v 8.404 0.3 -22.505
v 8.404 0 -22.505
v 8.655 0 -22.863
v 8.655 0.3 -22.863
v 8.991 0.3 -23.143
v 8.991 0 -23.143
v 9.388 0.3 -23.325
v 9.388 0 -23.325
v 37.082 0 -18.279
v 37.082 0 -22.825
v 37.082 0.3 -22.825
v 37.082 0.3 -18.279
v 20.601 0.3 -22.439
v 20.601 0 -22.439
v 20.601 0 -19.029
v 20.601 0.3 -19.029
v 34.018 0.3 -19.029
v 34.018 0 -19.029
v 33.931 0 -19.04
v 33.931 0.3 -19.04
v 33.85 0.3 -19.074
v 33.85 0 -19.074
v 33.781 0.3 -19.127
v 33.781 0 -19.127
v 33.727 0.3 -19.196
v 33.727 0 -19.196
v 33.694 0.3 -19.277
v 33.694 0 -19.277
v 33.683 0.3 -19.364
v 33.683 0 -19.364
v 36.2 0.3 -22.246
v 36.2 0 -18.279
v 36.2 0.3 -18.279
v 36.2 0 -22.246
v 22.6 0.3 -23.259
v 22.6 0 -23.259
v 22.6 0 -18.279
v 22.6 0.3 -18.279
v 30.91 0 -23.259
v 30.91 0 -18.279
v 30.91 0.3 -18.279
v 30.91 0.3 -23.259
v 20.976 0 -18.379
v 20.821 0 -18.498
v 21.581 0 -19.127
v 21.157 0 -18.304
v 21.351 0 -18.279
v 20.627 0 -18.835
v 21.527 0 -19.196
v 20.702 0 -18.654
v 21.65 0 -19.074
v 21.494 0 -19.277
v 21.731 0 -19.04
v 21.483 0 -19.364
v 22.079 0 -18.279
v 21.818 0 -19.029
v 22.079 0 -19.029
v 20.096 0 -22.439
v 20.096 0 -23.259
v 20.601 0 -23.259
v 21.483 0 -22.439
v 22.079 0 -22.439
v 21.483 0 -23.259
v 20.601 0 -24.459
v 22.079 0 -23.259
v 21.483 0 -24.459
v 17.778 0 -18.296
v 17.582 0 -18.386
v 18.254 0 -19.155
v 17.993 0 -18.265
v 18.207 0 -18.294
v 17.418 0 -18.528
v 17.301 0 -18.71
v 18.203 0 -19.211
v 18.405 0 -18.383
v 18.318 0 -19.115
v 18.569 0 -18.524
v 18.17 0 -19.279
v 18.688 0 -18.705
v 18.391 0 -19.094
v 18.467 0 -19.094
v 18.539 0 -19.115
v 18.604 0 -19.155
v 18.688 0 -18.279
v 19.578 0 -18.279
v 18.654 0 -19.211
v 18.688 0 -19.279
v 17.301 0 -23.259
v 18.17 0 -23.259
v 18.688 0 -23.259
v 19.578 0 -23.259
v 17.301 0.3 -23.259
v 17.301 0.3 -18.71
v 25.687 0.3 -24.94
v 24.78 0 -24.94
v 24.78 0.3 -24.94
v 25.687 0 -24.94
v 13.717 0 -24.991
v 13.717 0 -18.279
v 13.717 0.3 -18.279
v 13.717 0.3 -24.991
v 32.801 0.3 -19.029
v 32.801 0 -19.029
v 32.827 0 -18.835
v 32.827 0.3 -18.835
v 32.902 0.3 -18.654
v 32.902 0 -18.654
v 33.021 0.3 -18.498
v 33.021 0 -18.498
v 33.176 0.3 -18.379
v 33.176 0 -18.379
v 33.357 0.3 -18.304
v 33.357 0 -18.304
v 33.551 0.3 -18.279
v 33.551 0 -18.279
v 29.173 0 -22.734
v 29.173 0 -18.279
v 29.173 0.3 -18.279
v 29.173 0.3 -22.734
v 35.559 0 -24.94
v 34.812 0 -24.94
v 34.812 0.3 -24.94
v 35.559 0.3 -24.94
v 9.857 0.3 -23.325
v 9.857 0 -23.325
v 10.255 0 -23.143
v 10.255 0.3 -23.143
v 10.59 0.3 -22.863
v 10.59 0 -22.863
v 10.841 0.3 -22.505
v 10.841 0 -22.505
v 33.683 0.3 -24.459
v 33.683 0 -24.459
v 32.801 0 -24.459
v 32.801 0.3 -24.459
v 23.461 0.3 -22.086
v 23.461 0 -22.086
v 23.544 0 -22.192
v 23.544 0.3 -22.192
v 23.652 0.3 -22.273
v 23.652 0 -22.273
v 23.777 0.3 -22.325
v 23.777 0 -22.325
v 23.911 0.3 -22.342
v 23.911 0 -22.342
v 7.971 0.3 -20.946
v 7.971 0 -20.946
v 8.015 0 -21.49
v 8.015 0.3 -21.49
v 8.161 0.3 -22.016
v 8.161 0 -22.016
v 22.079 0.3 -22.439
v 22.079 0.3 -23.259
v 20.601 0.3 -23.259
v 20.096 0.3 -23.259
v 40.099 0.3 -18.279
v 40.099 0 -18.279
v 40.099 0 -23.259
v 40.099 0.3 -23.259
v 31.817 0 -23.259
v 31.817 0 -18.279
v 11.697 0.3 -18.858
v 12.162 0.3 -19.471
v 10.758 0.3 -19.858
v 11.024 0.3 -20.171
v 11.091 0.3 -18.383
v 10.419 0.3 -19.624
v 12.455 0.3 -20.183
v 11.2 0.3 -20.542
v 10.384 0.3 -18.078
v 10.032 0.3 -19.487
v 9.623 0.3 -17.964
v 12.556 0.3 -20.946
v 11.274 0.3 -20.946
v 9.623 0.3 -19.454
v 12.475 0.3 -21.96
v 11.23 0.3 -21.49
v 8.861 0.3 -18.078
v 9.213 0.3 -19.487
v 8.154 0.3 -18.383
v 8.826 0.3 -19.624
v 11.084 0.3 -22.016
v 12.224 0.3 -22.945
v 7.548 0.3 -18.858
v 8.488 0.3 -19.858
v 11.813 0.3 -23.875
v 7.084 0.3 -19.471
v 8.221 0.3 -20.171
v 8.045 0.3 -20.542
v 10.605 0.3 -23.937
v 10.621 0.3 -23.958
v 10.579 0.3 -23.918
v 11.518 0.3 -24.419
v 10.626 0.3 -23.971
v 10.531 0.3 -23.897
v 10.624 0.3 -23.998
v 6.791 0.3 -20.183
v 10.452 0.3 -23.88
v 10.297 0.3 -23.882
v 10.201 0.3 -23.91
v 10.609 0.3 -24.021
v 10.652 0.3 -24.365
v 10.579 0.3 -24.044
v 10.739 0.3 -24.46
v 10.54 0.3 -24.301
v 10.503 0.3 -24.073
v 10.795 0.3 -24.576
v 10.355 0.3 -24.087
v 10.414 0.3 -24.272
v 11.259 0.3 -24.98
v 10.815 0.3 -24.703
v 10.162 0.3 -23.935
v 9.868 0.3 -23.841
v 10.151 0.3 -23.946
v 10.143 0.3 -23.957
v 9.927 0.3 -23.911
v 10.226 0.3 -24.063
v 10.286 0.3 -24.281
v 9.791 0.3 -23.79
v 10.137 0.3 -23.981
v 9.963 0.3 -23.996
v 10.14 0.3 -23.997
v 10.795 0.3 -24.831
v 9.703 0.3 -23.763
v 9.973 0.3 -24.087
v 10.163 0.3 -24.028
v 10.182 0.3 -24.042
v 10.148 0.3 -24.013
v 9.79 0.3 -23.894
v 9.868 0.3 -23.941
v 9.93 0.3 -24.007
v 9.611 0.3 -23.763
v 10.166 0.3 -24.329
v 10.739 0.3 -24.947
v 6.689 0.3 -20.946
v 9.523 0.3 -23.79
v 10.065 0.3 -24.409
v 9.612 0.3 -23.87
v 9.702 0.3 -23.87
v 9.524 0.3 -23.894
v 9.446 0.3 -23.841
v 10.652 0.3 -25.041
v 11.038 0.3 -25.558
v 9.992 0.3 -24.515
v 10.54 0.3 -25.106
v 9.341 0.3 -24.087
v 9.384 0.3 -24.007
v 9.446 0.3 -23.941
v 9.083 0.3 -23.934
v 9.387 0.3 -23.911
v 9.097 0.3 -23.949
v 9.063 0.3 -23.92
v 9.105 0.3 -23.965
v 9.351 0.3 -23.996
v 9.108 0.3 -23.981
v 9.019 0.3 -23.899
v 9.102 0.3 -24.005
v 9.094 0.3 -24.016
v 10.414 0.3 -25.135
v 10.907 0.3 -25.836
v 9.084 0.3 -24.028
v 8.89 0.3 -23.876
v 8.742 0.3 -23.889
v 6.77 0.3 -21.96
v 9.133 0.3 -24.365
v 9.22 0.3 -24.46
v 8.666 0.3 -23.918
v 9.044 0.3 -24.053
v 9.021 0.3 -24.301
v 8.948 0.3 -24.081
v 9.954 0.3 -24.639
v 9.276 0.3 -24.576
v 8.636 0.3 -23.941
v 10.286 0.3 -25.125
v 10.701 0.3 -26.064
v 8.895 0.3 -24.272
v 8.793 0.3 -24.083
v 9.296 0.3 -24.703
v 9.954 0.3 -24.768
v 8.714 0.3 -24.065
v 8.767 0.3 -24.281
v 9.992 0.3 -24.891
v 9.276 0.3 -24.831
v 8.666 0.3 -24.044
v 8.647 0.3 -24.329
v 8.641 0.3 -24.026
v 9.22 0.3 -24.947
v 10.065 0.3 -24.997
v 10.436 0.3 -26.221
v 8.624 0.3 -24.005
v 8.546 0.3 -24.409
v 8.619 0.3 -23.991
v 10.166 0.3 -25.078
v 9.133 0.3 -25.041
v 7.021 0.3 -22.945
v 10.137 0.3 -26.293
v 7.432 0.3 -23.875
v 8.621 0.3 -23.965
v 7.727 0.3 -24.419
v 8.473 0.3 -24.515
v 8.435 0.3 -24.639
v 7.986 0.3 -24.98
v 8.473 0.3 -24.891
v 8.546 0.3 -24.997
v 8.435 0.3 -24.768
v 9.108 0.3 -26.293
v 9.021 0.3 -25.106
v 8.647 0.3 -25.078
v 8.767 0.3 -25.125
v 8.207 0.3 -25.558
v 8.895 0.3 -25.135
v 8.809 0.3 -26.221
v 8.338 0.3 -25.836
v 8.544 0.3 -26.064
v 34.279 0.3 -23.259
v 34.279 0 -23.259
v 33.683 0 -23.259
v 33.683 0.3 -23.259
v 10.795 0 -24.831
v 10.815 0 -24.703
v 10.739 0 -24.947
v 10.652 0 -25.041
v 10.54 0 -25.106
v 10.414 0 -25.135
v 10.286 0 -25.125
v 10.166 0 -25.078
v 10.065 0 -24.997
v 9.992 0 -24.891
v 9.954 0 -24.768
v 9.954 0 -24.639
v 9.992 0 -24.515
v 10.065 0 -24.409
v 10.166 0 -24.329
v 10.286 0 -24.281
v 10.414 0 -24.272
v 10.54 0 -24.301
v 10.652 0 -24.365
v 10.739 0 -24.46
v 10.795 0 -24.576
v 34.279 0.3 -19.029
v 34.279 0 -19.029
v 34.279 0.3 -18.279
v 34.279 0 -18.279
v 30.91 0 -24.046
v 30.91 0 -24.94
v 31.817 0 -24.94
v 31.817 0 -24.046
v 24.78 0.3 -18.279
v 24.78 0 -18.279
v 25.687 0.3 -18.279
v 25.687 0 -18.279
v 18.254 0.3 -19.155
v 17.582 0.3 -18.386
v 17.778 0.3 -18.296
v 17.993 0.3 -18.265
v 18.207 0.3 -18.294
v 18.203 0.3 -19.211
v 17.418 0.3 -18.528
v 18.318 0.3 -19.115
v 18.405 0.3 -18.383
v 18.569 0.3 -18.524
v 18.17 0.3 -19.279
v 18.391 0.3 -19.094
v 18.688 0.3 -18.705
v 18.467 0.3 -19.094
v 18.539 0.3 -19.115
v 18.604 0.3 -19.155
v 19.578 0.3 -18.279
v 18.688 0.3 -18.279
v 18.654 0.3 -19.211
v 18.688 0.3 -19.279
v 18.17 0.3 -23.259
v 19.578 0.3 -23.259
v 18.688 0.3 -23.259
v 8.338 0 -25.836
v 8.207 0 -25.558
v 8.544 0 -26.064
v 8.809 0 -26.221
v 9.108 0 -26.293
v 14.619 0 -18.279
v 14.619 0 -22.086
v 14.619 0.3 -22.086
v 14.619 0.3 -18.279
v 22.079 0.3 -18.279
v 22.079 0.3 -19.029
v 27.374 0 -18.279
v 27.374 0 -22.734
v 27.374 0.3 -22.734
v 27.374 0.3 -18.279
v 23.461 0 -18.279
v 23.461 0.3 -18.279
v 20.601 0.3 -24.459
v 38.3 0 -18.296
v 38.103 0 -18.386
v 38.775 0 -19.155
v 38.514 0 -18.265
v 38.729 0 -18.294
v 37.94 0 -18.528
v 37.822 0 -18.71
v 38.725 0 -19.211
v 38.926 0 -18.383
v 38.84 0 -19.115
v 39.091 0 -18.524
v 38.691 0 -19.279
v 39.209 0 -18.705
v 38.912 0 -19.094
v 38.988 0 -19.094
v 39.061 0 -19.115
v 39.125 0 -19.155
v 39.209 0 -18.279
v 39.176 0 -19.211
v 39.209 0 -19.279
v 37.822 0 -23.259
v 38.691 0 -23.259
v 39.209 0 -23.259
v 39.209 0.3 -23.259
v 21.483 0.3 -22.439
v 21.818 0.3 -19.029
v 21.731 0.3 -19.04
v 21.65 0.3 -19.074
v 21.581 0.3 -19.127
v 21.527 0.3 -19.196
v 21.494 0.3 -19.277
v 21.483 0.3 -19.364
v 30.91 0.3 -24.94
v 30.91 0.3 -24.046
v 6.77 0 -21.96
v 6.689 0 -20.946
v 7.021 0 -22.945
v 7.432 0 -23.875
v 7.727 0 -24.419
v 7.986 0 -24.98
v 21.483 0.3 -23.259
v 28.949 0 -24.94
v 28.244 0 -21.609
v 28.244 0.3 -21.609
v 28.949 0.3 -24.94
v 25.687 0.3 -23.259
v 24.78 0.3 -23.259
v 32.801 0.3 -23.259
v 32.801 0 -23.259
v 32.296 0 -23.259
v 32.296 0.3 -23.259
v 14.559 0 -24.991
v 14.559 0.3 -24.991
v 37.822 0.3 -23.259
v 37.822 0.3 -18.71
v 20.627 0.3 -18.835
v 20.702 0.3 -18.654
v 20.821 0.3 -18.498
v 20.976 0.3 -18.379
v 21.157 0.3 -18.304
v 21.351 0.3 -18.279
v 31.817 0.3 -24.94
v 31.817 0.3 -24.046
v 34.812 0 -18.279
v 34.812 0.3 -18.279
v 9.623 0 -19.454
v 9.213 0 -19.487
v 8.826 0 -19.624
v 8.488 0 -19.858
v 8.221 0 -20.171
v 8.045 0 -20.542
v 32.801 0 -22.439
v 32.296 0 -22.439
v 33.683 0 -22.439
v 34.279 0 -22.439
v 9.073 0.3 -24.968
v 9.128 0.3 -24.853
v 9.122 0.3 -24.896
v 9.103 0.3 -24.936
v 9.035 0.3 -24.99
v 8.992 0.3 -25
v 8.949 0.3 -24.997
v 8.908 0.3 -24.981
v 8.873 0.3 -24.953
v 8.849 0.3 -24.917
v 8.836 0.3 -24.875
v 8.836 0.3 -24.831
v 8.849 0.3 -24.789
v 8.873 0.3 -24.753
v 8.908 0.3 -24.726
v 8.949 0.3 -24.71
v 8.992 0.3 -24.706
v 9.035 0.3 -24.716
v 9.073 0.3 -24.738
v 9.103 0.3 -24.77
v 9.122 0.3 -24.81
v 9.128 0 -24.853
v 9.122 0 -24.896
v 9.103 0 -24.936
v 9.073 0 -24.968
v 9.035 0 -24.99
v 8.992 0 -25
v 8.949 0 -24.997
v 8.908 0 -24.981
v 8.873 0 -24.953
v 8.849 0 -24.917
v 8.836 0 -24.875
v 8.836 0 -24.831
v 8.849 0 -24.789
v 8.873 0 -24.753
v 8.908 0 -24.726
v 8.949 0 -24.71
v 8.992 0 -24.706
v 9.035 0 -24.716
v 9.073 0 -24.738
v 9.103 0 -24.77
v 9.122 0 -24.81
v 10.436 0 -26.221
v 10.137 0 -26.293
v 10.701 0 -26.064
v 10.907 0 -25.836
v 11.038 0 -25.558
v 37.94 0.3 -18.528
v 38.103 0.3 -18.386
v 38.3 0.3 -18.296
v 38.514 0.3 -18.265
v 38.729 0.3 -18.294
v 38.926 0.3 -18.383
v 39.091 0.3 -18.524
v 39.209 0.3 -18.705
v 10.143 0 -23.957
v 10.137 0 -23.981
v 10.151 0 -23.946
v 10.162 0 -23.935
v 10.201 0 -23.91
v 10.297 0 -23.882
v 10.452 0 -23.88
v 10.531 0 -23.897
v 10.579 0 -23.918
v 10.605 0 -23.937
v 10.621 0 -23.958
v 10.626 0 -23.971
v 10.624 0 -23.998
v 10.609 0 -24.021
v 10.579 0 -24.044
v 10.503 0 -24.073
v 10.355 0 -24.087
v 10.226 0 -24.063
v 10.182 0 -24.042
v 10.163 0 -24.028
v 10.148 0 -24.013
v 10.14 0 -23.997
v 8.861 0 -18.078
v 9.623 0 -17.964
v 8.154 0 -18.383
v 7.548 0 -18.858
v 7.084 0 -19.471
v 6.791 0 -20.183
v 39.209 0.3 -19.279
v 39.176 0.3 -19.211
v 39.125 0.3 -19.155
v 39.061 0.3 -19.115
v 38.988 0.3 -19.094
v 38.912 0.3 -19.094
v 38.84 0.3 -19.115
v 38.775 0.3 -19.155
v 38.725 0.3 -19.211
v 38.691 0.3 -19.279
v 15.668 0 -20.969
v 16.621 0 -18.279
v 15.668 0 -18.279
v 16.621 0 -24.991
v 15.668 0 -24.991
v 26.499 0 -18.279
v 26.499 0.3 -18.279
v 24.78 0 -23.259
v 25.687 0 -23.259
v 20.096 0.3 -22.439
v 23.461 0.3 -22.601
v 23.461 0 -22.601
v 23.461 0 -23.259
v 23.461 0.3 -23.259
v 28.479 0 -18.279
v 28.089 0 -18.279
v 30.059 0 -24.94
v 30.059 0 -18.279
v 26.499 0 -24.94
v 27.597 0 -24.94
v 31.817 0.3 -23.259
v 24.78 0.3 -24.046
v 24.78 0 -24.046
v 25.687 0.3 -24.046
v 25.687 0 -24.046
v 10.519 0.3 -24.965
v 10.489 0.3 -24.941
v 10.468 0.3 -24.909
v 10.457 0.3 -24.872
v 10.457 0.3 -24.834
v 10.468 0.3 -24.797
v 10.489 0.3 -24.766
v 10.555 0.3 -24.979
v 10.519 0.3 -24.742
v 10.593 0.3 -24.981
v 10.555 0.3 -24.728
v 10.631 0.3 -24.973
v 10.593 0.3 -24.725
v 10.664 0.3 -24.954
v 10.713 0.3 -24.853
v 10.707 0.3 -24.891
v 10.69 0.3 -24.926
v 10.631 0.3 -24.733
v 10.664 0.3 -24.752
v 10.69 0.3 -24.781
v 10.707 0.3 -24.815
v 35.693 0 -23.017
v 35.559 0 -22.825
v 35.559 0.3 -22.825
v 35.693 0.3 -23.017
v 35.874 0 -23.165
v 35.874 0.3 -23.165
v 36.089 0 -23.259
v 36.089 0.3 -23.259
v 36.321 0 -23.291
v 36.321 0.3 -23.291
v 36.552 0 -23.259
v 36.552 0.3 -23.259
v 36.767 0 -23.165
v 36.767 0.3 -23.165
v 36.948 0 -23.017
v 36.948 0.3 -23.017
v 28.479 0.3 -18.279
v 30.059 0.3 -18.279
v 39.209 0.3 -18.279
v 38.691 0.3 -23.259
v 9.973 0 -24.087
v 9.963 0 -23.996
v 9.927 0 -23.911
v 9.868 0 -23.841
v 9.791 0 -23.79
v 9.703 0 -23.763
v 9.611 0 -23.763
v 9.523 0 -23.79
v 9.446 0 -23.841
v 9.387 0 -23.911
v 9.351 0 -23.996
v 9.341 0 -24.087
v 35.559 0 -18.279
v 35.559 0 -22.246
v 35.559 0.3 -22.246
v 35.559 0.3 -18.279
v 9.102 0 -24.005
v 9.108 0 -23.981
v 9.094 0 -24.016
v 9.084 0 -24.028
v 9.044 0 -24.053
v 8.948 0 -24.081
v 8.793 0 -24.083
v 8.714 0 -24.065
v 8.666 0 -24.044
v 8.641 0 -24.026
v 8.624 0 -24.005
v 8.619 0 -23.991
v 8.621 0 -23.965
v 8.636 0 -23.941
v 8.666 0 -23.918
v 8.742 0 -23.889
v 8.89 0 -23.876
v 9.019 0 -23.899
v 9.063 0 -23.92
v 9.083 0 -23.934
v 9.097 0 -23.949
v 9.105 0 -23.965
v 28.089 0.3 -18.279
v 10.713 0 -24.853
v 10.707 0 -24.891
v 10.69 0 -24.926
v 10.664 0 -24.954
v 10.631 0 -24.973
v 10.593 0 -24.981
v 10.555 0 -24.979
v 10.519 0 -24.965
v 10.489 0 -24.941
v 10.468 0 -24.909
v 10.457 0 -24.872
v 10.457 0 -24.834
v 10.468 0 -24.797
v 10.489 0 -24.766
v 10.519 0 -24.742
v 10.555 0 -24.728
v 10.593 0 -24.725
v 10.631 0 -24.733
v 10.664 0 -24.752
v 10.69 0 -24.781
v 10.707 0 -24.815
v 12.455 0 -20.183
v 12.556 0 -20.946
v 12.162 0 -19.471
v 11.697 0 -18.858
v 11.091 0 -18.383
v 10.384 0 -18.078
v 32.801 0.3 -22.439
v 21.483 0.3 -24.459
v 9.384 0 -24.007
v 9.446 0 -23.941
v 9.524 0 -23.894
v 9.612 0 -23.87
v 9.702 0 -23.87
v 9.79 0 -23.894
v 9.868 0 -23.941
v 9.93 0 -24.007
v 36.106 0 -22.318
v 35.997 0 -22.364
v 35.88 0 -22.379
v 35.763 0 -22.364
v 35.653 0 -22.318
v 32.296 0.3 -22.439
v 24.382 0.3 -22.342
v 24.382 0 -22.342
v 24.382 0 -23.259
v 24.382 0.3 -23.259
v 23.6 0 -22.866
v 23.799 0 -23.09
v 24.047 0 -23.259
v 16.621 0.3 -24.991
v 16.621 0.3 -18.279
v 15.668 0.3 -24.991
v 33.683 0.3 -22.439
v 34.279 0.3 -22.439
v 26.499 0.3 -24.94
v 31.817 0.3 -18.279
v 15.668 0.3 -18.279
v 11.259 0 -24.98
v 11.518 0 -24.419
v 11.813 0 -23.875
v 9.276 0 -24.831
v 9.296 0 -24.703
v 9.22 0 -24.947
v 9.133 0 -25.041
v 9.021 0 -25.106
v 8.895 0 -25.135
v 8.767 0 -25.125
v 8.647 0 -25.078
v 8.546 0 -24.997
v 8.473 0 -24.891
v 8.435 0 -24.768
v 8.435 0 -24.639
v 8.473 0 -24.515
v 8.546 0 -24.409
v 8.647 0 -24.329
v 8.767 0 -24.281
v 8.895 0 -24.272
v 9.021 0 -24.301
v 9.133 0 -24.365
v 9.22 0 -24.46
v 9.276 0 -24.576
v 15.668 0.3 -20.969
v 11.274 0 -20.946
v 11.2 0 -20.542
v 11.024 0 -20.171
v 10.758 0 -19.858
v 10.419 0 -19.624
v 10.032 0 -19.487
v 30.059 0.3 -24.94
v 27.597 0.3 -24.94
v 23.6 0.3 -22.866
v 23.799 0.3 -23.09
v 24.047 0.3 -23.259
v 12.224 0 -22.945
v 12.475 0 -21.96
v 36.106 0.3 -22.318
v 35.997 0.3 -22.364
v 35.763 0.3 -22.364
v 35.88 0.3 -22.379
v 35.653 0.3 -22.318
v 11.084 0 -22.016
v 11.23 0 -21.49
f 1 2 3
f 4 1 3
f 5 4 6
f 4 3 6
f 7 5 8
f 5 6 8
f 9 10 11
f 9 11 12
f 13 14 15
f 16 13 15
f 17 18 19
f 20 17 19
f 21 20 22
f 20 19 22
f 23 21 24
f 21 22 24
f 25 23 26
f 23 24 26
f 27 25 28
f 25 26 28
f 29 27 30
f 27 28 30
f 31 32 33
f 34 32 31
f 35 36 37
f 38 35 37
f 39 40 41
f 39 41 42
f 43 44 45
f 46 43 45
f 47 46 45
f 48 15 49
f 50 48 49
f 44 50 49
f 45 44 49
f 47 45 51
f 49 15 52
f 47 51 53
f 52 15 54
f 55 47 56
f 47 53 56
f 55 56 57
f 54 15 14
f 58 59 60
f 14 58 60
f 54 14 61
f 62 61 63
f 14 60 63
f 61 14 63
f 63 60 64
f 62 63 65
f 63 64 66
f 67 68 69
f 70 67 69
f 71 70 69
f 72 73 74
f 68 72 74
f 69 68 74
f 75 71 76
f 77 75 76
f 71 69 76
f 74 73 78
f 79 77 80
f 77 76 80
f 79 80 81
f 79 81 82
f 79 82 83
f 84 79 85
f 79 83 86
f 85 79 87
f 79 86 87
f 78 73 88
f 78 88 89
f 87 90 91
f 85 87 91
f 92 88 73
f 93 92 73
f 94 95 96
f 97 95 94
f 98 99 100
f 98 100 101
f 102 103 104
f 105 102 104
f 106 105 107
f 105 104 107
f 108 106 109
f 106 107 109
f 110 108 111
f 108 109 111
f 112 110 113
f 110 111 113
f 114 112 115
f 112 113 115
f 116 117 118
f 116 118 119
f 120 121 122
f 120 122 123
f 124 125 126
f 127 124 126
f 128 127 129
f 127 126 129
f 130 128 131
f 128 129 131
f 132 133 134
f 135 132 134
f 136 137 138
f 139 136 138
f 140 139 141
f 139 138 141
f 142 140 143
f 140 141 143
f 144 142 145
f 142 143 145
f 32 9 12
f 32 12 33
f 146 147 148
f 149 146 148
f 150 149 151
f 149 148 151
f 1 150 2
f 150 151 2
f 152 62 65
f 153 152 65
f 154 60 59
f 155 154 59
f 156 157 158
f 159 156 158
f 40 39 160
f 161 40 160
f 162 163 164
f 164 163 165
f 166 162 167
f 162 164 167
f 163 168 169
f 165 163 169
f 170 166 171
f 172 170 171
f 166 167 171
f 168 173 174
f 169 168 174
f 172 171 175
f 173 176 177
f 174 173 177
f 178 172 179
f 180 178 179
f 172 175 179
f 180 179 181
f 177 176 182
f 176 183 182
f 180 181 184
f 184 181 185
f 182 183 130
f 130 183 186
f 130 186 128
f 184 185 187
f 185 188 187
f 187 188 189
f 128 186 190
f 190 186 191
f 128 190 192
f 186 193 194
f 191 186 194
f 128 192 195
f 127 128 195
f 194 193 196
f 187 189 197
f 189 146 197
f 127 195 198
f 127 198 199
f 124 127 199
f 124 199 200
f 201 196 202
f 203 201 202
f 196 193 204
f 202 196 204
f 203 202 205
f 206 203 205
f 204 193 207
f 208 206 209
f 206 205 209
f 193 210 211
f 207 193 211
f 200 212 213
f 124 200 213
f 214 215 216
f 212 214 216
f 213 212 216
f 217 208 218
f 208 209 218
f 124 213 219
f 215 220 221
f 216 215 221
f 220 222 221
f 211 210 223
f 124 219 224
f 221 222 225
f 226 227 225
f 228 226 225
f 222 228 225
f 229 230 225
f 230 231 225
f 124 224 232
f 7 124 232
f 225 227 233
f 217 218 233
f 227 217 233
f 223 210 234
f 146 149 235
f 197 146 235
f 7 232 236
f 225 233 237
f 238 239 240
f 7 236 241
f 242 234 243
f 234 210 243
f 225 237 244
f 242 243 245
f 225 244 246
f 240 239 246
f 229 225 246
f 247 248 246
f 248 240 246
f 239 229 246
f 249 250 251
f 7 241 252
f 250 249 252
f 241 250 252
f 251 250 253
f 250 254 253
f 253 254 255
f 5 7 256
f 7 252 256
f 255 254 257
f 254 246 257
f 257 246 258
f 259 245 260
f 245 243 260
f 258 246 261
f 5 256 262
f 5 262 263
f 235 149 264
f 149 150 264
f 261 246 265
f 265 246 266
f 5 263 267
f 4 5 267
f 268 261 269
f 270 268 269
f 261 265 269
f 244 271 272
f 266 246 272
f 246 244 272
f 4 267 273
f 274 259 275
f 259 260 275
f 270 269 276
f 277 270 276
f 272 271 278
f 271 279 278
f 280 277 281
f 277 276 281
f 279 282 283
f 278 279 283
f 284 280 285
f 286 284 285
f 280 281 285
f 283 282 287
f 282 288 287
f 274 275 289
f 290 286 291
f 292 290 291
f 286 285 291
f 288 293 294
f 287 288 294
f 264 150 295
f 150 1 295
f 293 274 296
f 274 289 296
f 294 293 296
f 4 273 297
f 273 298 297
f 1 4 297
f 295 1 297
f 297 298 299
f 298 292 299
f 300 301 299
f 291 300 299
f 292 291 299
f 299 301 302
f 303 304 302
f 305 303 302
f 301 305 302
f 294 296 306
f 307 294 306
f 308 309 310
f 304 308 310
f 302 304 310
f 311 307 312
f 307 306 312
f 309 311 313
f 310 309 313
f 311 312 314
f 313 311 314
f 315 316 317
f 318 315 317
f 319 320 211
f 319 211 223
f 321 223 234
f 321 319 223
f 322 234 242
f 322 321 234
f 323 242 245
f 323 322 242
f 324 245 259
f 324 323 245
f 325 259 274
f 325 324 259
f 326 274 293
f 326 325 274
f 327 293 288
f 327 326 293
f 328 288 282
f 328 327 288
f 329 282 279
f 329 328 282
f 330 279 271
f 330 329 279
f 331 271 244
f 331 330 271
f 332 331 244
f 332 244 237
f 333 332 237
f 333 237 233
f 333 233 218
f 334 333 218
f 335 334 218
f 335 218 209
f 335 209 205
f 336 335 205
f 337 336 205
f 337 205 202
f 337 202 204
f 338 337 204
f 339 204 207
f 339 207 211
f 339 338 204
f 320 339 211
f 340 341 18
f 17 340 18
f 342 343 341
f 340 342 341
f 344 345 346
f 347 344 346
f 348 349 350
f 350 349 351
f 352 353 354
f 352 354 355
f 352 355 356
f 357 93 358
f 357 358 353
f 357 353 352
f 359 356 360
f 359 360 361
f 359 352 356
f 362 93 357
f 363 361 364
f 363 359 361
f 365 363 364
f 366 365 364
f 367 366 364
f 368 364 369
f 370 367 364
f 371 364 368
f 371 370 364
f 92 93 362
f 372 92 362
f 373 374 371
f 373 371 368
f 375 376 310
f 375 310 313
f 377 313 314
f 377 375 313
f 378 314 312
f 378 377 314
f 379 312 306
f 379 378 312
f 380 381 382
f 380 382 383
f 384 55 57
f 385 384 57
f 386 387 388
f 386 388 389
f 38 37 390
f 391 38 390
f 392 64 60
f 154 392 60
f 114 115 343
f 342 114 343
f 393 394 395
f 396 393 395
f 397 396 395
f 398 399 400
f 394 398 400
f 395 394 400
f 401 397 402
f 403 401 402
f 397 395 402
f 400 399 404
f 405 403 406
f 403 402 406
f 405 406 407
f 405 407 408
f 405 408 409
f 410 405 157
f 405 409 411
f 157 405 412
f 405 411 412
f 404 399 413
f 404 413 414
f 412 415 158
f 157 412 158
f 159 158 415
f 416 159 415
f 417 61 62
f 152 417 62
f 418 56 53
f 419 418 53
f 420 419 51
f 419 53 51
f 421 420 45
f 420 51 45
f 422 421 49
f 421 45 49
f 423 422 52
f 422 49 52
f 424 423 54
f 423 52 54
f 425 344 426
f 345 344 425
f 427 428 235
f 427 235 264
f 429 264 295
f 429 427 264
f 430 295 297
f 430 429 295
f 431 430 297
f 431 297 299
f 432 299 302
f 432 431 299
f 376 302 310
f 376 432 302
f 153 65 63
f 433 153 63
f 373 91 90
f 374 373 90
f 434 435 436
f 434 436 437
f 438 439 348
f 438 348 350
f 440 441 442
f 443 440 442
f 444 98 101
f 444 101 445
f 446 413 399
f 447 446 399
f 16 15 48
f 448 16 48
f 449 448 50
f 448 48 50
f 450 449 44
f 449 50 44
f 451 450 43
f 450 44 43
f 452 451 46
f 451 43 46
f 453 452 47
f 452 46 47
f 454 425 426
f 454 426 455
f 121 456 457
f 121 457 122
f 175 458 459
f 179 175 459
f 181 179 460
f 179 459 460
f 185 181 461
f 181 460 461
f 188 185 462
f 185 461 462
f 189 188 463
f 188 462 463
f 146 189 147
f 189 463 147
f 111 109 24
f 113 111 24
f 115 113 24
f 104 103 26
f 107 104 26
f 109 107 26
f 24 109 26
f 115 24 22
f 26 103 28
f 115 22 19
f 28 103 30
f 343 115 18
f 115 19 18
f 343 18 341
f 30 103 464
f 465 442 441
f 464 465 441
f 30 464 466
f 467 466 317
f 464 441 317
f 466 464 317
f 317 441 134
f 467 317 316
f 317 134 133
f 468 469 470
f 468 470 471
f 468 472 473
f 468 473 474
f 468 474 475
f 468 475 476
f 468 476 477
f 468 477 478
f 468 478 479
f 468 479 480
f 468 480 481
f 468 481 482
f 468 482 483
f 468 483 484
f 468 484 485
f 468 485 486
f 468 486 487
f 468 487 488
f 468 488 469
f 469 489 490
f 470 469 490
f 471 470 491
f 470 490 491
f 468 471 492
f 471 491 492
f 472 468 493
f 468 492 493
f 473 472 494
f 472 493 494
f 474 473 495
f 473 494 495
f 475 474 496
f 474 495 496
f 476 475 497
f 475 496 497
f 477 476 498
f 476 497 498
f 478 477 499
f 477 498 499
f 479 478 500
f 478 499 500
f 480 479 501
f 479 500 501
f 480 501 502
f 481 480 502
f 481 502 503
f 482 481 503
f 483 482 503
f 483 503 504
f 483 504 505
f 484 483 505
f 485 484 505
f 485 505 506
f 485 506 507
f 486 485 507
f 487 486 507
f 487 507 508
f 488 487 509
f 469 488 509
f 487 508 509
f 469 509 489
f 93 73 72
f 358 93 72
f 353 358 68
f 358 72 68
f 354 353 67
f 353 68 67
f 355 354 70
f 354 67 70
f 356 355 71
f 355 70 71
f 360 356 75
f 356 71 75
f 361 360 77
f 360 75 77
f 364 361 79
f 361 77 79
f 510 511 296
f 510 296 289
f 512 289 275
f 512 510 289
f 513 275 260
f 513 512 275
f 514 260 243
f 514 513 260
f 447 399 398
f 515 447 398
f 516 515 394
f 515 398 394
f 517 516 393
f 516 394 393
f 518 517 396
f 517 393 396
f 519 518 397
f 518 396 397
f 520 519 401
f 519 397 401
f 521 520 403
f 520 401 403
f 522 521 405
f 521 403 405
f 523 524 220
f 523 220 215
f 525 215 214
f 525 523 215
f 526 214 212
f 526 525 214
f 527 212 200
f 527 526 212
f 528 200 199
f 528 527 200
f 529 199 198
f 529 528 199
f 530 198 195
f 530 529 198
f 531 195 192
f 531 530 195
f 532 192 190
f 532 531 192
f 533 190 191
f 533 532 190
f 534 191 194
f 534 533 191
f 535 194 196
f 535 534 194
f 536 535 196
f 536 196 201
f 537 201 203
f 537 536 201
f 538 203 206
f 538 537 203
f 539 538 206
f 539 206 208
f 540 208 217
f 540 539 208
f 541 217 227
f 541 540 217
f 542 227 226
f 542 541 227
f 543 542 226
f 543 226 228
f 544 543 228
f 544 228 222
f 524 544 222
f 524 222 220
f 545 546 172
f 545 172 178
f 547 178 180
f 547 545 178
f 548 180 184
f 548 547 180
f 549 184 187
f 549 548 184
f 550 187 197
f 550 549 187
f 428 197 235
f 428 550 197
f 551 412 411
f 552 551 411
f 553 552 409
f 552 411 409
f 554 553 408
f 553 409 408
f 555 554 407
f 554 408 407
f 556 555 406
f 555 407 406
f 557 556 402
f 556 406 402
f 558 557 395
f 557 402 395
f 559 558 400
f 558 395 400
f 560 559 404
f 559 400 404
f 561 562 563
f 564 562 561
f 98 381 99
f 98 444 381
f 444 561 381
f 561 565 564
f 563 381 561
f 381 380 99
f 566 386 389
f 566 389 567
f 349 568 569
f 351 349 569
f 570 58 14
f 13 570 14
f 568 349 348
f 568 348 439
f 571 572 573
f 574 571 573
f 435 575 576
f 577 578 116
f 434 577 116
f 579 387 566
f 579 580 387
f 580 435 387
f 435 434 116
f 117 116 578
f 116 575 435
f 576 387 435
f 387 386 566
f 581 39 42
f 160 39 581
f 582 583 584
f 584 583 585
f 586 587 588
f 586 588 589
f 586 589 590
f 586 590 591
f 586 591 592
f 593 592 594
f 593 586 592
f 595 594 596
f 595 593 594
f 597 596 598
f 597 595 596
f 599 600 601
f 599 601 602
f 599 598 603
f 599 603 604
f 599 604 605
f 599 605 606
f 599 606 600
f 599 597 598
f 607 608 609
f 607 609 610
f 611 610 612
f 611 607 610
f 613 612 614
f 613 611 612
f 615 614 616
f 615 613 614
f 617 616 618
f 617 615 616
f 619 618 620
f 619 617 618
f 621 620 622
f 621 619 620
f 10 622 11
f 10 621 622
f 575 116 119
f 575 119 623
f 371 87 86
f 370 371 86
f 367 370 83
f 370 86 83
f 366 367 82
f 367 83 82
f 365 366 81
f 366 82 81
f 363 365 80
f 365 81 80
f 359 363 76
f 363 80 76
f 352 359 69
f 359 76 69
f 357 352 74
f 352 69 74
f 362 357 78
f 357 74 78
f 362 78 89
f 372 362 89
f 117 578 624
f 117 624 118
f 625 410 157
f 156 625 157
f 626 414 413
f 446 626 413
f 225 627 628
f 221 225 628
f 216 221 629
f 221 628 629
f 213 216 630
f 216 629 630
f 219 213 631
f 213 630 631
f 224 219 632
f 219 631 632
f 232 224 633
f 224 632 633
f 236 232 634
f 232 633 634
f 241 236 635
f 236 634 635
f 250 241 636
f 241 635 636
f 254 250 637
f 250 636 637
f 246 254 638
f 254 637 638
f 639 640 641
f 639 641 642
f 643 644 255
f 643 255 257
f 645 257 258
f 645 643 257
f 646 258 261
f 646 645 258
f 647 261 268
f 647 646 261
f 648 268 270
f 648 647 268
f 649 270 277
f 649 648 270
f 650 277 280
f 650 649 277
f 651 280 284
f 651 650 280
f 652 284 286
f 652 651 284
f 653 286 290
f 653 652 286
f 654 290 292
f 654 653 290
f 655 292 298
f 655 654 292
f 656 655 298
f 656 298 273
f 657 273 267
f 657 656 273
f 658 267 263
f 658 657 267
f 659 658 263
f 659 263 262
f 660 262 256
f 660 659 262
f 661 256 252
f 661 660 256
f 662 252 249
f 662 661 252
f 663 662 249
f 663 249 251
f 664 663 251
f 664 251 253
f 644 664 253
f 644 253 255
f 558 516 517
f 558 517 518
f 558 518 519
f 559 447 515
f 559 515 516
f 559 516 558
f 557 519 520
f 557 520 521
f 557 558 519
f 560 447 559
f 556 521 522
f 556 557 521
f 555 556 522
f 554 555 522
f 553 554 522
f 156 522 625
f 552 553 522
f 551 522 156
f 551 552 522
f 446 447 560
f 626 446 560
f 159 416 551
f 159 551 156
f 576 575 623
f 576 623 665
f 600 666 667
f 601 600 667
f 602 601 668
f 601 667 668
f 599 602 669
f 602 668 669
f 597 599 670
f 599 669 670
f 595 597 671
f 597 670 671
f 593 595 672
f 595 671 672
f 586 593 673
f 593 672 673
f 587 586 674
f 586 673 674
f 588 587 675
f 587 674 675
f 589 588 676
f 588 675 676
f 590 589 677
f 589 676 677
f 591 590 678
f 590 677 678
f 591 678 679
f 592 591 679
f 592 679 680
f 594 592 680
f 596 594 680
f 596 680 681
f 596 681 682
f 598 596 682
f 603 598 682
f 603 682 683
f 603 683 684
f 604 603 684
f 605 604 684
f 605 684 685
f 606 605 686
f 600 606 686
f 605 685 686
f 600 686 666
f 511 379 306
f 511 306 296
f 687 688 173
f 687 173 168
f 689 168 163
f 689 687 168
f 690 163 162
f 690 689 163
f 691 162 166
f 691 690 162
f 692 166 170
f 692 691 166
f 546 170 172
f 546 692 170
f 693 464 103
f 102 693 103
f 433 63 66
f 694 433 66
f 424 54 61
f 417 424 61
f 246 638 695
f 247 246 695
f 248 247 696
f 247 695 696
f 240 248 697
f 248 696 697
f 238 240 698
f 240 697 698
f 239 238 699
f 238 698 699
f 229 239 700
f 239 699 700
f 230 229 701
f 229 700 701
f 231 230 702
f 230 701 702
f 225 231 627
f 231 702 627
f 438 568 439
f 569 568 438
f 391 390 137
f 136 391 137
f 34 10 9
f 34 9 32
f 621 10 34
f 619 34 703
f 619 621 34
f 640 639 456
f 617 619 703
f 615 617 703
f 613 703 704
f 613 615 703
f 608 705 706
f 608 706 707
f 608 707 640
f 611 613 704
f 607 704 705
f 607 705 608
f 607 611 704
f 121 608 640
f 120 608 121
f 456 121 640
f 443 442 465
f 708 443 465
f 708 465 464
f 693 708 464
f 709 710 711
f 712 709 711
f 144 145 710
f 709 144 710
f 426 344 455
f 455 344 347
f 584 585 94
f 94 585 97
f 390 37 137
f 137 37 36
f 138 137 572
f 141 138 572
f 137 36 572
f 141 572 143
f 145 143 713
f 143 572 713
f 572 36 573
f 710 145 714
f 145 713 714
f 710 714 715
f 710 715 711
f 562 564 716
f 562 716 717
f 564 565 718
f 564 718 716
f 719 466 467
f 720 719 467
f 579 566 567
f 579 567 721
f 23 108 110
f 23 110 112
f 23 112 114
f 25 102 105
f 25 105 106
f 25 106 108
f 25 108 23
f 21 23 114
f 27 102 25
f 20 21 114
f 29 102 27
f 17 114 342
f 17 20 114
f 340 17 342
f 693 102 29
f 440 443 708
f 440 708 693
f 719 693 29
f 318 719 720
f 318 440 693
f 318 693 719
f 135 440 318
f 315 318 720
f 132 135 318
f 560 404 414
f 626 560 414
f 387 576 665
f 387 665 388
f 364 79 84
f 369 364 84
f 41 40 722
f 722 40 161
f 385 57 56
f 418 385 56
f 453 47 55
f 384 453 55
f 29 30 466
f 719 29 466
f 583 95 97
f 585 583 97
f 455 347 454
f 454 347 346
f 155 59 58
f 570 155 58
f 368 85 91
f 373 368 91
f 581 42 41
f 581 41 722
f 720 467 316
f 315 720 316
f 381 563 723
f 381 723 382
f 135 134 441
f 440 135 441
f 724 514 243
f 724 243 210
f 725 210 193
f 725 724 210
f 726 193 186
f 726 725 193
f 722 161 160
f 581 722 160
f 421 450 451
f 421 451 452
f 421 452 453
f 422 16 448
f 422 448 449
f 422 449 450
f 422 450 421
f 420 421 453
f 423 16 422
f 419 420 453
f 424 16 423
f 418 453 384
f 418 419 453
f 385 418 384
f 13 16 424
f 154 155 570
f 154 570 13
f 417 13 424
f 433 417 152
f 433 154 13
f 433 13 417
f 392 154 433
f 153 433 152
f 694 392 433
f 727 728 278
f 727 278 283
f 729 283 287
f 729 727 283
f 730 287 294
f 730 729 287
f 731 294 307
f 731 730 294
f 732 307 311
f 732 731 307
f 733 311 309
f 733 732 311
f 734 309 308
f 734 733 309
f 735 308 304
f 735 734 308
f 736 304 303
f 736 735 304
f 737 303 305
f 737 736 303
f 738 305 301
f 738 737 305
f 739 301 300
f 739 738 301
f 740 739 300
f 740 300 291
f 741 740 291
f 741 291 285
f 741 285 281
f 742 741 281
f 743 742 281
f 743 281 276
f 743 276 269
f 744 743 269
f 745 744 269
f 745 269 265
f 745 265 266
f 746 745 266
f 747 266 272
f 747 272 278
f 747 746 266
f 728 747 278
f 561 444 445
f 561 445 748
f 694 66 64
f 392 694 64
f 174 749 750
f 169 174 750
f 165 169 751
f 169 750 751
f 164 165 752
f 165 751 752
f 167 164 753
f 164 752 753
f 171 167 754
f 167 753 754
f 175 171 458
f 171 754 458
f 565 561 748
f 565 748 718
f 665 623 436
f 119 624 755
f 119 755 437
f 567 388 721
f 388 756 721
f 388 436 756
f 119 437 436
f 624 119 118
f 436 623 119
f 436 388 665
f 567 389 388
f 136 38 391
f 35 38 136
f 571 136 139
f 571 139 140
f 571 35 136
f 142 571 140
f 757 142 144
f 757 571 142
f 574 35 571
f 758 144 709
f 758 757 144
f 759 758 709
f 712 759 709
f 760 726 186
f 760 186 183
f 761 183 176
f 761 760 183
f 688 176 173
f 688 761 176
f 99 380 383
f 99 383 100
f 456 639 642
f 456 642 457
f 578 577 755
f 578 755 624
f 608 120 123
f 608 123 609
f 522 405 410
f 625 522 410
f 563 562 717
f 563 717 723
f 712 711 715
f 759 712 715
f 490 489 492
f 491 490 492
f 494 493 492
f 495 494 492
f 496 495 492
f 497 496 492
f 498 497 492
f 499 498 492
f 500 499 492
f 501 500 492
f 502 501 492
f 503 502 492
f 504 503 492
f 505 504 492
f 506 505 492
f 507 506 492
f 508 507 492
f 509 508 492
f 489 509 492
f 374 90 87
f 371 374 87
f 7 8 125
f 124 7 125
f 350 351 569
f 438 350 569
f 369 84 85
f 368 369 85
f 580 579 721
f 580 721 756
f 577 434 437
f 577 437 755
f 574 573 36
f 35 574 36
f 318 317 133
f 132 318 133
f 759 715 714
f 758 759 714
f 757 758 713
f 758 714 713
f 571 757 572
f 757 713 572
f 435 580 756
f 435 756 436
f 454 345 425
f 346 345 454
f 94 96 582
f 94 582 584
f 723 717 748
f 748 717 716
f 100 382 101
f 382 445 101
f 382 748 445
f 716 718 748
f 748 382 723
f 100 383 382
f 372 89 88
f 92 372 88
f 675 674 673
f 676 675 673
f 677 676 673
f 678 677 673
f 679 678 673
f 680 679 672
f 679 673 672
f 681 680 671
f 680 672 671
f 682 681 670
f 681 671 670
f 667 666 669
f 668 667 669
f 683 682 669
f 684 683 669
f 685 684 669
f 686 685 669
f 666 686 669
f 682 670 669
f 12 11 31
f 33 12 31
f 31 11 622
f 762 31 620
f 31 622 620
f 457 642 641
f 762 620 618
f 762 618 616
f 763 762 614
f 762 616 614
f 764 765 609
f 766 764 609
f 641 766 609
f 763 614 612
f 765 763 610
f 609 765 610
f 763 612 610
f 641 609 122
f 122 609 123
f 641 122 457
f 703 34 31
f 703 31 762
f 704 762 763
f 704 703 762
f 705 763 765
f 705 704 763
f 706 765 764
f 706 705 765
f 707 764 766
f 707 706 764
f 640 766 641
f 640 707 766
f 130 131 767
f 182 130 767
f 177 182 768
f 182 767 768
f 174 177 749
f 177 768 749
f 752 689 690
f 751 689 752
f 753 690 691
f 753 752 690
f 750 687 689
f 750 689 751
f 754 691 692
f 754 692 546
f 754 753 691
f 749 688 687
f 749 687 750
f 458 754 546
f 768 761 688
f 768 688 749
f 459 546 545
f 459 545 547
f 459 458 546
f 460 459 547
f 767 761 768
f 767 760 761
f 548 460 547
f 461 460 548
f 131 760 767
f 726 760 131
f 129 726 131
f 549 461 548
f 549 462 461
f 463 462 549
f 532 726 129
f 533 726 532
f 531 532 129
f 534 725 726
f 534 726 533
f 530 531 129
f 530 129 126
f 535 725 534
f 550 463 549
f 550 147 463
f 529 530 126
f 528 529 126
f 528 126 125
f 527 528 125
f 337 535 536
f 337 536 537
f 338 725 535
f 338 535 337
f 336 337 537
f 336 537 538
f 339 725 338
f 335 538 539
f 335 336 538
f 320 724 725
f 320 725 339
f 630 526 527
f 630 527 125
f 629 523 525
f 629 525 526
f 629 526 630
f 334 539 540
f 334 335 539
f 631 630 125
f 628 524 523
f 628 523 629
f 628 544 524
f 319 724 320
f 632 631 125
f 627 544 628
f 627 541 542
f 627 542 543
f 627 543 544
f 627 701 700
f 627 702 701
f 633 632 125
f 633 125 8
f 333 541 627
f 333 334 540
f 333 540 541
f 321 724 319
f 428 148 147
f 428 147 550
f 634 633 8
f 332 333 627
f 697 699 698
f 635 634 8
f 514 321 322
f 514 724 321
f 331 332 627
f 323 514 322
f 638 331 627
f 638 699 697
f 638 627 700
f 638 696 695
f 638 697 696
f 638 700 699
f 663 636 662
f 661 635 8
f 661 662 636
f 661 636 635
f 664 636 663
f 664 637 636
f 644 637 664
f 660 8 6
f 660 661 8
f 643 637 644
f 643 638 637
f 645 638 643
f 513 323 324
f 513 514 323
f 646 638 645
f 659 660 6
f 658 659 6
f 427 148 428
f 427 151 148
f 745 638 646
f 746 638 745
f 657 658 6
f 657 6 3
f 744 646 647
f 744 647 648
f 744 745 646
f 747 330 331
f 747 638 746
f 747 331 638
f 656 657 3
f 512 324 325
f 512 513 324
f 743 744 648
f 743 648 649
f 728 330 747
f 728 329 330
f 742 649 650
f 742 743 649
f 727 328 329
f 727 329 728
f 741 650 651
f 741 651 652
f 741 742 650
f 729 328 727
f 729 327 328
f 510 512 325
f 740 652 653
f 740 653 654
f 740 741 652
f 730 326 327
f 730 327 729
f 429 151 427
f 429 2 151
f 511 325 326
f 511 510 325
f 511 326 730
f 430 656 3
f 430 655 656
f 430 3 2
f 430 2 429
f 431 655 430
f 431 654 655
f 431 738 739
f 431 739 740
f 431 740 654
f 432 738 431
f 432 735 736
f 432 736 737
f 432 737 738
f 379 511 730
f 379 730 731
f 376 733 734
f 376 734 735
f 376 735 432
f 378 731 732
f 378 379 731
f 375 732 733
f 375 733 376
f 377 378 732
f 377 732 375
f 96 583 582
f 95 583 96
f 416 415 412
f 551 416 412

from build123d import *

# Parameters (mm, degrees)
BOSS_EXTRUDE1_DEPTH    = 0.3
BOSS_EXTRUDE1_2_DEPTH  = 0.3
BOSS_EXTRUDE1_3_DEPTH  = 0.3
BOSS_EXTRUDE1_4_DEPTH  = 0.3
BOSS_EXTRUDE1_5_DEPTH  = 0.3
SKETCH4_W              = 0.907139685
SKETCH4_H              = 4.980142663
BOSS_EXTRUDE1_6_DEPTH  = 0.3
SKETCH4_H_2            = 0.893475319
BOSS_EXTRUDE1_7_DEPTH  = 0.3
BOSS_EXTRUDE1_8_DEPTH  = 0.3
BOSS_EXTRUDE1_9_DEPTH  = 0.3
BOSS_EXTRUDE1_10_DEPTH = 0.3
BOSS_EXTRUDE1_11_DEPTH = 0.3
BOSS_EXTRUDE1_12_DEPTH = 0.3
SKETCH4_6_R            = 0.147132828
BOSS_EXTRUDE2_DEPTH    = 0.3
SKETCH4_6_R_2          = 0.128746351
BOSS_EXTRUDE2_2_DEPTH  = 0.3
SKETCH4_6_R_3          = 0.432552287
SKETCH4_6_RX           = 0.245064734
SKETCH4_6_RY           = 0.105973939
BOSS_EXTRUDE2_3_DEPTH  = 0.3


with BuildPart() as part:
    # Sketch4 → Boss-Extrude1 (new body)
    with BuildSketch(Plane(origin=(0, 0, 0), x_dir=(1, 0, 0), z_dir=(0, 1, 0))):
        Polygon((13.716879182, 18.278788665), (13.716879182, 24.991425443), (14.559248335, 24.991425443), (15.667628801, 20.968795109), (15.667628801, 24.991425443), (16.620836001, 24.991425443), (16.620836001, 18.278788665), (15.667628801, 18.278788665), (14.618732293, 22.08553467), (14.618732293, 18.278788665), align=None)
    extrude(amount=BOSS_EXTRUDE1_DEPTH)


with BuildPart() as body_2:
    # Sketch4 → Boss-Extrude1 2 (new body)
    with BuildSketch(Plane(origin=(0, 0, 0), x_dir=(1, 0, 0), z_dir=(0, 1, 0))):
        with BuildLine():
            Line((17.30087467, 23.258931328), (17.30087467, 18.710151468))
            ThreePointArc((17.30087467, 18.710151468), (17.992644328, 18.264567096), (18.687742823, 18.704940544))
            Line((18.687742823, 18.704940544), (18.687742823, 18.278788665))
            Line((18.687742823, 18.278788665), (19.577615355, 18.278788665))
            Line((19.577615355, 18.278788665), (19.577615355, 23.258931328))
            Line((19.577615355, 23.258931328), (18.687742823, 23.258931328))
            Line((18.687742823, 23.258931328), (18.687742823, 19.279390612))
            ThreePointArc((18.687742823, 19.279390612), (18.428784342, 19.091594892), (18.16982586, 19.279390612))
            Line((18.16982586, 19.279390612), (18.16982586, 23.258931328))
            Line((18.16982586, 23.258931328), (17.30087467, 23.258931328))
        make_face()
    extrude(amount=BOSS_EXTRUDE1_2_DEPTH)


with BuildPart() as body_3:
    # Sketch4 → Boss-Extrude1 3 (new body)
    with BuildSketch(Plane(origin=(0, 0, 0), x_dir=(1, 0, 0), z_dir=(0, 1, 0))):
        with BuildLine():
            Line((37.822440447, 23.258931328), (37.822440447, 18.710151468))
            ThreePointArc((37.822440447, 18.710151468), (38.514210105, 18.264567096), (39.209308601, 18.704940544))
            Line((39.209308601, 18.704940544), (39.209308601, 18.278788665))
            Line((39.209308601, 18.278788665), (40.099181132, 18.278788665))
            Line((40.099181132, 18.278788665), (40.099181132, 23.258931328))
            Line((40.099181132, 23.258931328), (39.209308601, 23.258931328))
            Line((39.209308601, 23.258931328), (39.209308601, 19.279390612))
            ThreePointArc((39.209308601, 19.279390612), (38.950350119, 19.091594892), (38.691391637, 19.279390612))
            Line((38.691391637, 19.279390612), (38.691391637, 23.258931328))
            Line((38.691391637, 23.258931328), (37.822440447, 23.258931328))
        make_face()
    extrude(amount=BOSS_EXTRUDE1_3_DEPTH)


with BuildPart() as body_4:
    # Sketch4 → Boss-Extrude1 4 (new body)
    with BuildSketch(Plane(origin=(0, 0, 0), x_dir=(1, 0, 0), z_dir=(0, 1, 0))):
        with BuildLine():
            Line((21.482574077, 19.364036479), (21.482574077, 22.439333993))
            Line((21.482574077, 22.439333993), (22.079282394, 22.439333993))
            Line((22.079282394, 22.439333993), (22.079282394, 23.258931328))
            Line((22.079282394, 23.258931328), (21.482574077, 23.258931328))
            Line((21.482574077, 23.258931328), (21.482574077, 24.458962143))
            Line((21.482574077, 24.458962143), (20.601281794, 24.458962143))
            Line((20.601281794, 24.458962143), (20.601281794, 23.258931328))
            Line((20.601281794, 23.258931328), (20.096374756, 23.258931328))
            Line((20.096374756, 23.258931328), (20.096374756, 22.439333993))
            Line((20.096374756, 22.439333993), (20.601281794, 22.439333993))
            Line((20.601281794, 22.439333993), (20.601281794, 19.028803404))
            ThreePointArc((20.601281794, 19.028803404), (20.820956025, 18.498462896), (21.351296532, 18.278788665))
            Line((21.351296532, 18.278788665), (22.079282394, 18.278788665))
            Line((22.079282394, 18.278788665), (22.079282394, 19.028803404))
            Line((22.079282394, 19.028803404), (21.817807152, 19.028803404))
            ThreePointArc((21.817807152, 19.028803404), (21.580761571, 19.126990898), (21.482574077, 19.364036479))
        make_face()
    extrude(amount=BOSS_EXTRUDE1_4_DEPTH)


with BuildPart() as body_5:
    # Sketch4 → Boss-Extrude1 5 (new body)
    with BuildSketch(Plane(origin=(0, 0, 0), x_dir=(1, 0, 0), z_dir=(0, 1, 0))):
        with BuildLine():
            Line((23.460734175, 22.600690426), (23.460734175, 23.258931328))
            Line((23.460734175, 23.258931328), (22.600423707, 23.258931328))
            Line((22.600423707, 23.258931328), (22.600423707, 18.278788665))
            Line((22.600423707, 18.278788665), (23.460734175, 18.278788665))
            Line((23.460734175, 18.278788665), (23.460734175, 22.08553467))
            ThreePointArc((23.460734175, 22.08553467), (23.651964482, 22.273390501), (23.911100107, 22.342002244))
            Line((23.911100107, 22.342002244), (24.381658901, 22.342002244))
            Line((24.381658901, 22.342002244), (24.381658901, 23.258931328))
            Line((24.381658901, 23.258931328), (24.047039314, 23.258931328))
            ThreePointArc((24.047039314, 23.258931328), (23.692752783, 22.984263823), (23.460734175, 22.600690426))
        make_face()
    extrude(amount=BOSS_EXTRUDE1_5_DEPTH)


with BuildPart() as body_6:
    # Sketch4 → Boss-Extrude1 6 (new body)
    with BuildSketch(Plane(origin=(0, 0, 0), x_dir=(1, 0, 0), z_dir=(0, 1, 0))):
        with Locations((25.233709616, 20.768859997)):
            Rectangle(SKETCH4_W, SKETCH4_H)
    extrude(amount=BOSS_EXTRUDE1_6_DEPTH)


with BuildPart() as body_7:
    # Sketch4 → Boss-Extrude1 7 (new body)
    with BuildSketch(Plane(origin=(0, 0, 0), x_dir=(1, 0, 0), z_dir=(0, 1, 0))):
        with Locations((25.233709616, 24.49285274)):
            Rectangle(SKETCH4_W, SKETCH4_H_2)
    extrude(amount=BOSS_EXTRUDE1_7_DEPTH)


with BuildPart() as body_8:
    # Sketch4 → Boss-Extrude1 8 (new body)
    with BuildSketch(Plane(origin=(0, 0, 0), x_dir=(1, 0, 0), z_dir=(0, 1, 0))):
        Polygon((26.49920087, 18.278788665), (26.49920087, 24.939590399), (27.597204595, 24.939590399), (28.244448896, 21.609189532), (28.949482866, 24.939590399), (30.059044525, 24.939590399), (30.059044525, 18.278788665), (29.172637859, 18.278788665), (29.172637859, 22.734019126), (28.47914926, 18.278788665), (28.088740973, 18.278788665), (27.37412163, 22.734019126), (27.37412163, 18.278788665), align=None)
    extrude(amount=BOSS_EXTRUDE1_8_DEPTH)


with BuildPart() as body_9:
    # Sketch4 → Boss-Extrude1 9 (new body)
    with BuildSketch(Plane(origin=(0, 0, 0), x_dir=(1, 0, 0), z_dir=(0, 1, 0))):
        with BuildLine():
            Line((34.812485031, 24.939590399), (35.559303143, 24.939590399))
            Line((35.559303143, 24.939590399), (35.559303143, 22.824753136))
            ThreePointArc((35.559303143, 22.824753136), (36.320550869, 23.290755349), (37.081798595, 22.824753136))
            Line((37.081798595, 22.824753136), (37.081798595, 18.278788665))
            Line((37.081798595, 18.278788665), (36.200381016, 18.278788665))
            Line((36.200381016, 18.278788665), (36.200381016, 22.246216016))
            ThreePointArc((36.200381016, 22.246216016), (35.87984208, 22.378987591), (35.559303143, 22.246216016))
            Line((35.559303143, 22.246216016), (35.559303143, 18.278788665))
            Line((35.559303143, 18.278788665), (34.812485031, 18.278788665))
            Line((34.812485031, 18.278788665), (34.812485031, 24.939590399))
        make_face()
    extrude(amount=BOSS_EXTRUDE1_9_DEPTH)


with BuildPart() as body_10:
    # Sketch4 → Boss-Extrude1 10 (new body)
    with BuildSketch(Plane(origin=(0, 0, 0), x_dir=(1, 0, 0), z_dir=(0, 1, 0))):
        with Locations((31.36312338, 24.49285274)):
            Rectangle(SKETCH4_W, SKETCH4_H_2)
    extrude(amount=BOSS_EXTRUDE1_10_DEPTH)


with BuildPart() as body_11:
    # Sketch4 → Boss-Extrude1 11 (new body)
    with BuildSketch(Plane(origin=(0, 0, 0), x_dir=(1, 0, 0), z_dir=(0, 1, 0))):
        with Locations((31.36312338, 20.768859997)):
            Rectangle(SKETCH4_W, SKETCH4_H)
    extrude(amount=BOSS_EXTRUDE1_11_DEPTH)


with BuildPart() as body_12:
    # Sketch4 → Boss-Extrude1 12 (new body)
    with BuildSketch(Plane(origin=(0, 0, 0), x_dir=(1, 0, 0), z_dir=(0, 1, 0))):
        with BuildLine():
            Line((32.801281794, 23.258931328), (32.296374756, 23.258931328))
            Line((32.296374756, 23.258931328), (32.296374756, 22.439333993))
            Line((32.296374756, 22.439333993), (32.801281794, 22.439333993))
            Line((32.801281794, 22.439333993), (32.801281794, 19.028803404))
            ThreePointArc((32.801281794, 19.028803404), (33.020956025, 18.498462896), (33.551296532, 18.278788665))
            Line((33.551296532, 18.278788665), (34.279282394, 18.278788665))
            Line((34.279282394, 18.278788665), (34.279282394, 19.028803404))
            Line((34.279282394, 19.028803404), (34.017807152, 19.028803404))
            ThreePointArc((34.017807152, 19.028803404), (33.780761571, 19.126990898), (33.682574077, 19.364036479))
            Line((33.682574077, 19.364036479), (33.682574077, 22.439333993))
            Line((33.682574077, 22.439333993), (34.279282394, 22.439333993))
            Line((34.279282394, 22.439333993), (34.279282394, 23.258931328))
            Line((34.279282394, 23.258931328), (33.682574077, 23.258931328))
            Line((33.682574077, 23.258931328), (33.682574077, 24.458962143))
            Line((33.682574077, 24.458962143), (32.801281794, 24.458962143))
            Line((32.801281794, 24.458962143), (32.801281794, 23.258931328))
        make_face()
    extrude(amount=BOSS_EXTRUDE1_12_DEPTH)


with BuildPart() as body_13:
    # Sketch4<6> → Boss-Extrude2 (new body)
    with BuildSketch(Plane(origin=(0, 0, 0), x_dir=(1, 0, 0), z_dir=(0, 1, 0))):
        with Locations((8.981326725, 24.853101935)):
            Circle(SKETCH4_6_R)
    extrude(amount=BOSS_EXTRUDE2_DEPTH)


with BuildPart() as body_14:
    # Sketch4<6> → Boss-Extrude2 2 (new body)
    with BuildSketch(Plane(origin=(0, 0, 0), x_dir=(1, 0, 0), z_dir=(0, 1, 0))):
        with Locations((10.58386497, 24.853101935)):
            Circle(SKETCH4_6_R_2)
    extrude(amount=BOSS_EXTRUDE2_2_DEPTH)


with BuildPart() as body_15:
    # Sketch4<6> → Boss-Extrude2 3 (new body)
    with BuildSketch(Plane(origin=(0, 0, 0), x_dir=(1, 0, 0), z_dir=(0, 1, 0))):
        with BuildLine():
            Line((9.108171814, 26.292778247), (10.136960985, 26.292778247))
            ThreePointArc((10.136960985, 26.292778247), (10.700721386, 26.064086351), (11.037739466, 25.557584045))
            ThreePointArc((11.037739466, 25.557584045), (11.384182372, 24.69751888), (11.812673895, 23.875247764))
            ThreePointArc((11.812673895, 23.875247764), (12.370307343, 22.457879176), (12.556346989, 20.946165571))
            ThreePointArc((12.556346989, 20.946165571), (11.696696401, 18.857707801), (9.6225664, 17.96404135))
            ThreePointArc((9.6225664, 17.96404135), (7.548436398, 18.857707801), (6.68878581, 20.946165571))
            ThreePointArc((6.68878581, 20.946165571), (6.874825456, 22.457879176), (7.432458904, 23.875247764))
            ThreePointArc((7.432458904, 23.875247764), (7.860950427, 24.69751888), (8.207393333, 25.557584045))
            ThreePointArc((8.207393333, 25.557584045), (8.544411413, 26.064086351), (9.108171814, 26.292778247))
        make_face()
        with Locations((8.86310708, 24.703169162)):
            Circle(SKETCH4_6_R_3, mode=Mode.SUBTRACT)
        with Locations((10.382025719, 24.703169162)):
            Circle(SKETCH4_6_R_3, mode=Mode.SUBTRACT)
        with Locations((8.86310708, 23.981221703)):
            Ellipse(SKETCH4_6_RX, SKETCH4_6_RY, mode=Mode.SUBTRACT)
        with Locations(Location((10.382025719, 23.981221703), (0, 0, 180))):
            Ellipse(SKETCH4_6_RX, SKETCH4_6_RY, mode=Mode.SUBTRACT)
        with BuildLine():
            Line((9.387739323, 23.325325591), (9.857393476, 23.325325591))
            ThreePointArc((9.857393476, 23.325325591), (10.431567344, 23.013741731), (10.840795065, 22.504533714))
            ThreePointArc((10.840795065, 22.504533714), (11.169631295, 21.756520837), (11.274420962, 20.946165571))
            ThreePointArc((11.274420962, 20.946165571), (10.757600506, 19.857805401), (9.6225664, 19.453665794))
            ThreePointArc((9.6225664, 19.453665794), (8.487532294, 19.857805401), (7.970711837, 20.946165571))
            ThreePointArc((7.970711837, 20.946165571), (8.075501505, 21.756520837), (8.404337734, 22.504533714))
            ThreePointArc((8.404337734, 22.504533714), (8.813565456, 23.013741731), (9.387739323, 23.325325591))
        make_face(mode=Mode.SUBTRACT)
        with BuildLine():
            ThreePointArc((9.340815034, 24.087195642), (9.656991499, 23.86705486), (9.973167963, 24.087195642))
            ThreePointArc((9.973167963, 24.087195642), (9.656991499, 23.760023424), (9.340815034, 24.087195642))
        make_face(mode=Mode.SUBTRACT)
    extrude(amount=BOSS_EXTRUDE2_3_DEPTH)


solid = Compound([part.part, body_2.part, body_3.part, body_4.part, body_5.part, body_6.part, body_7.part, body_8.part, body_9.part, body_10.part, body_11.part, body_12.part, body_13.part, body_14.part, body_15.part])
